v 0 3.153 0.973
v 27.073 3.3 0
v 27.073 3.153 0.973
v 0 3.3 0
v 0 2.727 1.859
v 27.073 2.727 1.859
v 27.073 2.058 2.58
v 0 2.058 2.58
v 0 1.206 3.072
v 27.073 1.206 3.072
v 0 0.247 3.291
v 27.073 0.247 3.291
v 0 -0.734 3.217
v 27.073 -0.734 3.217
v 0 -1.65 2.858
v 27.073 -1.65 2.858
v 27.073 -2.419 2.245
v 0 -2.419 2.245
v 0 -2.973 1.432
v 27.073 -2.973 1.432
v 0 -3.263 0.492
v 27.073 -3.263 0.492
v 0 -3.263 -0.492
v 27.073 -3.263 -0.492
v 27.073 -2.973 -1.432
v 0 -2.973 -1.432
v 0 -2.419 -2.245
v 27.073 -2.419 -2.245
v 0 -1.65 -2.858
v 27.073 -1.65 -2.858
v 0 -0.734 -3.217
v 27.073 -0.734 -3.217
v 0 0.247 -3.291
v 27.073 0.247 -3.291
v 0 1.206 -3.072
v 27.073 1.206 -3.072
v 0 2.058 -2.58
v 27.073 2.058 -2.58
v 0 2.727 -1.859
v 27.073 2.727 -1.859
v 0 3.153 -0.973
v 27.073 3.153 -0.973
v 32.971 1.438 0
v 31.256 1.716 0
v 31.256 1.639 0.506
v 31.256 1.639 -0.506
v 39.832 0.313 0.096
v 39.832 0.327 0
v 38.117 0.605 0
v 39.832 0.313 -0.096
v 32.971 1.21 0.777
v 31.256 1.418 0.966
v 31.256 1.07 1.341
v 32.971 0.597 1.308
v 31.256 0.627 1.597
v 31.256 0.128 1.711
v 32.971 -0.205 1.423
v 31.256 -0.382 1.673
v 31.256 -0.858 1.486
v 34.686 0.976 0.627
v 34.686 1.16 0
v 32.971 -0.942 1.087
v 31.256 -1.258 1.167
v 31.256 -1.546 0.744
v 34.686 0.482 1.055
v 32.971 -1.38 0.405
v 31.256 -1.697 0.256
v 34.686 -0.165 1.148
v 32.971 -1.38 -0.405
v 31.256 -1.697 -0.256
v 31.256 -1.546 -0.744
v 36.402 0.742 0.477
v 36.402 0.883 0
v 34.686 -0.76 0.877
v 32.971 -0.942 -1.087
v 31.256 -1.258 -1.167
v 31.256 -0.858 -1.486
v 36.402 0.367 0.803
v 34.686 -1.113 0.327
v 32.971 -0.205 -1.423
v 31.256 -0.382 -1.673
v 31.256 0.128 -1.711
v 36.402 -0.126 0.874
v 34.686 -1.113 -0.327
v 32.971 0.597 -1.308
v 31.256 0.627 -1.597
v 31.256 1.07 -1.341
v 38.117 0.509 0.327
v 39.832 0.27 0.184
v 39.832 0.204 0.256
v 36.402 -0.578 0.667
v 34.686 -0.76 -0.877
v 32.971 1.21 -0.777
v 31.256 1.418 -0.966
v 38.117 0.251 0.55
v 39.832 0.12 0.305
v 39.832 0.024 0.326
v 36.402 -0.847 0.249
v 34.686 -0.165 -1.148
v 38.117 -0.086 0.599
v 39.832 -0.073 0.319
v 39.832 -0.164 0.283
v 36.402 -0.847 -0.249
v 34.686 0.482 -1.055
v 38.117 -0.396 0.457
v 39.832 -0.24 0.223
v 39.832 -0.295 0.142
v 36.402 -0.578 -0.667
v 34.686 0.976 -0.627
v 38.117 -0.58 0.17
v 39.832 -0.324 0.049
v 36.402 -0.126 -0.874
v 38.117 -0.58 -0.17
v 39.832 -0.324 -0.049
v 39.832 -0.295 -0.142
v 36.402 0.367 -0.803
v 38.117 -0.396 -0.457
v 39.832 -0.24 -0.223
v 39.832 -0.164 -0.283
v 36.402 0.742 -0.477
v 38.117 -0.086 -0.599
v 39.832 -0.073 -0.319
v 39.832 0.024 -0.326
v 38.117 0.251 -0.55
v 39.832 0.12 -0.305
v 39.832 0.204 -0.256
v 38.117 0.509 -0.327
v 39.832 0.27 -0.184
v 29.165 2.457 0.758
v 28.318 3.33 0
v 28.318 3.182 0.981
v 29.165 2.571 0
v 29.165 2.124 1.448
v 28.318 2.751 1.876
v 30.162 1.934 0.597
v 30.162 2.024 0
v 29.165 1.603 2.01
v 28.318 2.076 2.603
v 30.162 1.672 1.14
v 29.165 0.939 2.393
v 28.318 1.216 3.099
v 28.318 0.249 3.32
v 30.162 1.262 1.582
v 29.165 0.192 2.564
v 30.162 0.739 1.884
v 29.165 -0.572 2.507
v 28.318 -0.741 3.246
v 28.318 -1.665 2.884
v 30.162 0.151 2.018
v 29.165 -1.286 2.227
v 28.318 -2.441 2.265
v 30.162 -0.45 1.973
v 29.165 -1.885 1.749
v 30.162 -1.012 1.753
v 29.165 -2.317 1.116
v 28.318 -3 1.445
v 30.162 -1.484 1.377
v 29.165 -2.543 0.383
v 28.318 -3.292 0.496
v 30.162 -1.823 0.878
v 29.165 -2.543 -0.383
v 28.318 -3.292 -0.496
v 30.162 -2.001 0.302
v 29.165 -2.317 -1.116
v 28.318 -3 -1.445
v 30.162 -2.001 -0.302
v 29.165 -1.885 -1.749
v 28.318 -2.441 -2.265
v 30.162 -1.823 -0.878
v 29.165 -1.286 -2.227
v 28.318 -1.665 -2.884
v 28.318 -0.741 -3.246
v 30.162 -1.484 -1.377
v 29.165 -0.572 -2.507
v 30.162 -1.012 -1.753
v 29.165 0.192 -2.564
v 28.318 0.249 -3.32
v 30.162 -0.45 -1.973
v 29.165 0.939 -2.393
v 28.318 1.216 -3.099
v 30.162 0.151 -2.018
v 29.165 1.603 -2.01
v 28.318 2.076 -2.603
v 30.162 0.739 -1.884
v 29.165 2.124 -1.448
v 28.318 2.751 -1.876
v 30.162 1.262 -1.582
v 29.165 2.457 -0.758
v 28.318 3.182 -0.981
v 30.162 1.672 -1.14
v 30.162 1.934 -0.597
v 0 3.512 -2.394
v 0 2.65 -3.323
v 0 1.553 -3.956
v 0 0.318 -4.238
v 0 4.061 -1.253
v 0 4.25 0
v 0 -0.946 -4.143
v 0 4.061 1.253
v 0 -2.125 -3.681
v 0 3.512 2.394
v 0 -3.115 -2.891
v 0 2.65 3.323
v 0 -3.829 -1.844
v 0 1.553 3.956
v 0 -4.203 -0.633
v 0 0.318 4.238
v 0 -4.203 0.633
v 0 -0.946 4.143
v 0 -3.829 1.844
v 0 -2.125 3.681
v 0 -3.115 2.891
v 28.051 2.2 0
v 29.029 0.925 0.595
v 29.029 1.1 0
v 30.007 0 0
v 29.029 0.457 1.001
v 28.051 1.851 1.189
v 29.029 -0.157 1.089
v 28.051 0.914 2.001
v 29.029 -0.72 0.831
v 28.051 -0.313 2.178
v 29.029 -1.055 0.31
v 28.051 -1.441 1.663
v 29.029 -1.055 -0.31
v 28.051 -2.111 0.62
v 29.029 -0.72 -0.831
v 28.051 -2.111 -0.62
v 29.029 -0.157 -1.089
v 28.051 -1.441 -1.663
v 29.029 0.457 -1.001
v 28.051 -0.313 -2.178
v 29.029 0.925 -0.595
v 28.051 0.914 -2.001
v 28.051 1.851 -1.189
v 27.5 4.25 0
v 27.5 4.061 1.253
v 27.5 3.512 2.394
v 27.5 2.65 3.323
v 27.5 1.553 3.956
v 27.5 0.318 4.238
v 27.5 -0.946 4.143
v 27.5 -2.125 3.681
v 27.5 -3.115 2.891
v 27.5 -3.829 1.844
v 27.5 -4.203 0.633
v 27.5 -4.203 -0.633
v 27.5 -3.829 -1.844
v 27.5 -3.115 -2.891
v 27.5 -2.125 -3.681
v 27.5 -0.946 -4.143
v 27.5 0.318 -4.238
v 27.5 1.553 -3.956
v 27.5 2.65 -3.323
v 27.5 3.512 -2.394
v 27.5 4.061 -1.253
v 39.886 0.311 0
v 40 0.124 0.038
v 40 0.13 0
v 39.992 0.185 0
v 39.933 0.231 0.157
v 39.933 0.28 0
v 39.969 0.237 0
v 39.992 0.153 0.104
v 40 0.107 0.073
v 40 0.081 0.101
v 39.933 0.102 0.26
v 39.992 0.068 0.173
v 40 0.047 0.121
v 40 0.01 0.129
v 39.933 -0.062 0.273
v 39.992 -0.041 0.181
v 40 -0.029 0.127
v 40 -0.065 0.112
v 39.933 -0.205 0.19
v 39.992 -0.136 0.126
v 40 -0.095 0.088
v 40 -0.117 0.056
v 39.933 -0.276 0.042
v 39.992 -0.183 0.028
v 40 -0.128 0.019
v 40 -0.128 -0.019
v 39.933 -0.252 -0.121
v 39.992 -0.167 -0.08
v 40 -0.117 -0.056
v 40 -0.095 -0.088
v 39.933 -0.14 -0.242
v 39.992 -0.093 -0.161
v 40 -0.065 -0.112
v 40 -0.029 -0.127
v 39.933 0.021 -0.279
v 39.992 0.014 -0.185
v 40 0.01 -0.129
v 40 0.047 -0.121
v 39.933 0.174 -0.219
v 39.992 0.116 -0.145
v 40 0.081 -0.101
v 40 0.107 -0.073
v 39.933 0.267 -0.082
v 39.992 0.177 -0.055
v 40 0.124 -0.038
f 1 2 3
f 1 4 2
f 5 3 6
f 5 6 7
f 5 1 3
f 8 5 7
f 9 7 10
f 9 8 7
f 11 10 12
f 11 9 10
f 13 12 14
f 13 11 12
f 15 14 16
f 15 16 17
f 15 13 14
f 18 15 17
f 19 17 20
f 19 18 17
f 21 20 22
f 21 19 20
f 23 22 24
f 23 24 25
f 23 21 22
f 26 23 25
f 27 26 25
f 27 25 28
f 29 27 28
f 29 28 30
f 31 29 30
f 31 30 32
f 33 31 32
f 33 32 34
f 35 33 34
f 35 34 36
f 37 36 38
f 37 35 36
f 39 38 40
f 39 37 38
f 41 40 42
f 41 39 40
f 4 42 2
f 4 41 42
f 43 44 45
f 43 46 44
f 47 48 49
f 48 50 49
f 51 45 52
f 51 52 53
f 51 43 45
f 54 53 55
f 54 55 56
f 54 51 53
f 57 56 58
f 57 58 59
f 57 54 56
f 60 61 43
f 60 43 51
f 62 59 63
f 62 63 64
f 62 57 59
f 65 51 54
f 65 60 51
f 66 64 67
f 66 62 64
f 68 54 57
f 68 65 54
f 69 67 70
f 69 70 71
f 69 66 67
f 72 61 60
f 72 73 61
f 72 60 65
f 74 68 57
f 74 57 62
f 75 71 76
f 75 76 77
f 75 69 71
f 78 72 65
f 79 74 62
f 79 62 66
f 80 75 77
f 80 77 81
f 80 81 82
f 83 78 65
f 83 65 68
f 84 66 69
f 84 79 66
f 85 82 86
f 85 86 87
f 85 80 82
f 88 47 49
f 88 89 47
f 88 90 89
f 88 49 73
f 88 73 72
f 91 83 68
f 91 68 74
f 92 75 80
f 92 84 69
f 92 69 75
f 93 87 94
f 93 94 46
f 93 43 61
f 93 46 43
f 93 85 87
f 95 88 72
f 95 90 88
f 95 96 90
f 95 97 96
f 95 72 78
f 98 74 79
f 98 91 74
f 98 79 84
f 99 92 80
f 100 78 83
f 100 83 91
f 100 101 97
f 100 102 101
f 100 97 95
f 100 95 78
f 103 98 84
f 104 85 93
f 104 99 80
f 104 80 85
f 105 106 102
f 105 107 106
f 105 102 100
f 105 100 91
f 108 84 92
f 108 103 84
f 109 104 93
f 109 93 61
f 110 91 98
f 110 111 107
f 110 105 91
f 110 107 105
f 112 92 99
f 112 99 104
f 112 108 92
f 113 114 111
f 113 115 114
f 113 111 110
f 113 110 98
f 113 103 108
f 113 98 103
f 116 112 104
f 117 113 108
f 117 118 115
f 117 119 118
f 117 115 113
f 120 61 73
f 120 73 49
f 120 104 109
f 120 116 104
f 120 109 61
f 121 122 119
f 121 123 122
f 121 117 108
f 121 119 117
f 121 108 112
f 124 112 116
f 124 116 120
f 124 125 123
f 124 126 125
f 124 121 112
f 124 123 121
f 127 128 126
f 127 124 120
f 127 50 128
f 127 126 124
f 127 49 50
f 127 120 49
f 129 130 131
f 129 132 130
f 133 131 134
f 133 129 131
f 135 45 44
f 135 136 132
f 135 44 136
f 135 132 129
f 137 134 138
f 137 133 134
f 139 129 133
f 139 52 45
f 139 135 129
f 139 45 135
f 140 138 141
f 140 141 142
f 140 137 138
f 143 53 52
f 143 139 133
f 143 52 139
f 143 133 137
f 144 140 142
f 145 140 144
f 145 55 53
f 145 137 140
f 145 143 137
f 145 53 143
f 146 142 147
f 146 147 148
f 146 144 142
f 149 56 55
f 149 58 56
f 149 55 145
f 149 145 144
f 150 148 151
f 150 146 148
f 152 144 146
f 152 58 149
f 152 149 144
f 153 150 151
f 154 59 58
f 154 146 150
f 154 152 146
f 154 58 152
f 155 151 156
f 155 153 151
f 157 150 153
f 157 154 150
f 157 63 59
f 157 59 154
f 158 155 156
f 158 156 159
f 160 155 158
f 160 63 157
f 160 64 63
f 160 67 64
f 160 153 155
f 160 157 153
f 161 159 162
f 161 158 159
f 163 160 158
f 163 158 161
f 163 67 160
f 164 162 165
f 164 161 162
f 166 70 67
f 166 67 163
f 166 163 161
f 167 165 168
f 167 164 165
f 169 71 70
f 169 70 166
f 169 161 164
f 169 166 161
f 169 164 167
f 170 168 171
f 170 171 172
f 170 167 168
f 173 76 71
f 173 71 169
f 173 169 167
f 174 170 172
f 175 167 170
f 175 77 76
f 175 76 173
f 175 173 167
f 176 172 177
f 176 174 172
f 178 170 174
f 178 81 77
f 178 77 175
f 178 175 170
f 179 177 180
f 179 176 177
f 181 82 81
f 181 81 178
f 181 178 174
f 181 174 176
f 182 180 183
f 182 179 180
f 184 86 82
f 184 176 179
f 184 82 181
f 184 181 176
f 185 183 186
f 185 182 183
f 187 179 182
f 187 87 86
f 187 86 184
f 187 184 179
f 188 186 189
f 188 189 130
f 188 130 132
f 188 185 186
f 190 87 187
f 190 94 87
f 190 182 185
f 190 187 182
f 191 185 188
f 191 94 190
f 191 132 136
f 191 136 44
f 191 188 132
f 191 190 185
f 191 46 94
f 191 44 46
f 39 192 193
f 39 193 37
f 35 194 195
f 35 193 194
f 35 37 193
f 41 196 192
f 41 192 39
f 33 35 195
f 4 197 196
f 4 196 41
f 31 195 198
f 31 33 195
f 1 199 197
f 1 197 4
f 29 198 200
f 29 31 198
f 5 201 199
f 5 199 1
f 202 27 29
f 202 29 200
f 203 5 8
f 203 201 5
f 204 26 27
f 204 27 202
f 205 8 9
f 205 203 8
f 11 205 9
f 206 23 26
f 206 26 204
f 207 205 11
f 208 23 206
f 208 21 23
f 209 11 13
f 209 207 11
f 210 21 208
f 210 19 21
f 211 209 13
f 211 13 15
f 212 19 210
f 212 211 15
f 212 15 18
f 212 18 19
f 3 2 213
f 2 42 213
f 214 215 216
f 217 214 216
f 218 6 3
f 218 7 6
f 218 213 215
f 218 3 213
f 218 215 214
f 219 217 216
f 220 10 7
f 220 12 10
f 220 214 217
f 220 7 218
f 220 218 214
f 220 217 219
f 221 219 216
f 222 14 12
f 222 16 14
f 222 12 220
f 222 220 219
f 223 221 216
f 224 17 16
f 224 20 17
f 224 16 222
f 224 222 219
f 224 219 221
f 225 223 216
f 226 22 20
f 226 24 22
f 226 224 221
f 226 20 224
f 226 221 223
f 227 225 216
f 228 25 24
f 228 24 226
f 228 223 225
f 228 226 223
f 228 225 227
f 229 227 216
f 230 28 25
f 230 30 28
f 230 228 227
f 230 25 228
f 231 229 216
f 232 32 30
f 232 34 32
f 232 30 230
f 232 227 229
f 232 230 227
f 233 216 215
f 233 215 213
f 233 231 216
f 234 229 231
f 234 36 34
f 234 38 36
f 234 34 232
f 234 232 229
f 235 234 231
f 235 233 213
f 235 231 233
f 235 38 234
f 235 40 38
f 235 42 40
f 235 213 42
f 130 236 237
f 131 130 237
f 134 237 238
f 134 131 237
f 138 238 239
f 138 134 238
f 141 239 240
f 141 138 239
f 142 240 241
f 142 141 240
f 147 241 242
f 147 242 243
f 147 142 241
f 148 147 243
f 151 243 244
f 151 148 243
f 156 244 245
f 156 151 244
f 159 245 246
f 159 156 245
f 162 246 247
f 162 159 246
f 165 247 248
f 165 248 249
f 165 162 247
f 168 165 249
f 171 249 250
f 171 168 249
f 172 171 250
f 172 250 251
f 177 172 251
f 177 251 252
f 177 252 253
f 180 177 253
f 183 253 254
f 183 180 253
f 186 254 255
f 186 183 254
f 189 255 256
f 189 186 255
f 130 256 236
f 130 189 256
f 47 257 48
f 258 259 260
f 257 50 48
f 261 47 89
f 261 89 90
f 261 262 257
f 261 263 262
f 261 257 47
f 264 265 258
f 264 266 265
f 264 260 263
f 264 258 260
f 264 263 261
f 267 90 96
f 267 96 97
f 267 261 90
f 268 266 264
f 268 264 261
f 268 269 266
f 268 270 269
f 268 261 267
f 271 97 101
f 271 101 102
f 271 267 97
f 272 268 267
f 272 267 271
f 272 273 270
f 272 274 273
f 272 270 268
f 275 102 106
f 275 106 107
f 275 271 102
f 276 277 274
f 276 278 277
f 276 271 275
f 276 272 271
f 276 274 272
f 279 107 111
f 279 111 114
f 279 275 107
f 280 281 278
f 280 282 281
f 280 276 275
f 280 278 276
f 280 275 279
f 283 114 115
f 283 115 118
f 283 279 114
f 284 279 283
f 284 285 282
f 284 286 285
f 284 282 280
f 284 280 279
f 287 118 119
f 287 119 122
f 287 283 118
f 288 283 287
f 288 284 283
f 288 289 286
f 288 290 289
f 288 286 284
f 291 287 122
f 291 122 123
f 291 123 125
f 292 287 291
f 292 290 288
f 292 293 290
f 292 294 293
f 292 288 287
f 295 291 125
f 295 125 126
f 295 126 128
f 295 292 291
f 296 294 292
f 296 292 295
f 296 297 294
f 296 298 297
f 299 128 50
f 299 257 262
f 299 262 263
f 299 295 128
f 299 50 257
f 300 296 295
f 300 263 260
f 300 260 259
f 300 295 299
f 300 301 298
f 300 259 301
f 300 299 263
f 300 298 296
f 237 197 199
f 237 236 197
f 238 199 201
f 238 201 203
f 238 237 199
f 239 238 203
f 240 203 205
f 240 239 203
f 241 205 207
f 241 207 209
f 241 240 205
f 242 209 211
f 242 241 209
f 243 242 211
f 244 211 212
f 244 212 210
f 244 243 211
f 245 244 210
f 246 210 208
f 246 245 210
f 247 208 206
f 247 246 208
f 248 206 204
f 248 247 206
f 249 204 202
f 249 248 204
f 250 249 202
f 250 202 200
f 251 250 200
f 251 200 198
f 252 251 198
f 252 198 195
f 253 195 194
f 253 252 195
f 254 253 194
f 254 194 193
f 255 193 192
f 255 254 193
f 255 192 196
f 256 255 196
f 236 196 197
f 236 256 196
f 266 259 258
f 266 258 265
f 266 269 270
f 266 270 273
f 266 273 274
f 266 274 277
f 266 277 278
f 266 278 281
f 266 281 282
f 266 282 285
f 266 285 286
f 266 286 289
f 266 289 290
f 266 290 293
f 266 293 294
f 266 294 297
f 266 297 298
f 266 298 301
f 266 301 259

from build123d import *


with BuildPart() as part:
    # Esquisse1 → Révolution1 (revolve)
    with BuildSketch(Plane.XY):
        with BuildLine():
            Line((0, 3.3), (0, 4.25))
            Line((0, 4.25), (0.95, 4.25))
            Line((0.95, 4.25), (27.5, 4.25))
            Line((27.5, 4.25), (28.318139594, 3.329592957))
            ThreePointArc((28.318139594, 3.329592957), (29.647828221, 2.26910367), (31.256068325, 1.715684176))
            Line((31.256068325, 1.715684176), (39.831964715, 0.327205713))
            ThreePointArc((39.831964715, 0.327205713), (39.952303879, 0.259405019), (40, 0.129776594))
            Line((40, 0.129776594), (40, 0))
            Line((40, 0), (30.006720572, 0))
            Line((30.006720572, 0), (27.073387239, 3.3))
            Line((27.073387239, 3.3), (0, 3.3))
        make_face()
    revolve(axis=Axis((0, 0, 0), (1, 0, 0)))


solid = part.part
